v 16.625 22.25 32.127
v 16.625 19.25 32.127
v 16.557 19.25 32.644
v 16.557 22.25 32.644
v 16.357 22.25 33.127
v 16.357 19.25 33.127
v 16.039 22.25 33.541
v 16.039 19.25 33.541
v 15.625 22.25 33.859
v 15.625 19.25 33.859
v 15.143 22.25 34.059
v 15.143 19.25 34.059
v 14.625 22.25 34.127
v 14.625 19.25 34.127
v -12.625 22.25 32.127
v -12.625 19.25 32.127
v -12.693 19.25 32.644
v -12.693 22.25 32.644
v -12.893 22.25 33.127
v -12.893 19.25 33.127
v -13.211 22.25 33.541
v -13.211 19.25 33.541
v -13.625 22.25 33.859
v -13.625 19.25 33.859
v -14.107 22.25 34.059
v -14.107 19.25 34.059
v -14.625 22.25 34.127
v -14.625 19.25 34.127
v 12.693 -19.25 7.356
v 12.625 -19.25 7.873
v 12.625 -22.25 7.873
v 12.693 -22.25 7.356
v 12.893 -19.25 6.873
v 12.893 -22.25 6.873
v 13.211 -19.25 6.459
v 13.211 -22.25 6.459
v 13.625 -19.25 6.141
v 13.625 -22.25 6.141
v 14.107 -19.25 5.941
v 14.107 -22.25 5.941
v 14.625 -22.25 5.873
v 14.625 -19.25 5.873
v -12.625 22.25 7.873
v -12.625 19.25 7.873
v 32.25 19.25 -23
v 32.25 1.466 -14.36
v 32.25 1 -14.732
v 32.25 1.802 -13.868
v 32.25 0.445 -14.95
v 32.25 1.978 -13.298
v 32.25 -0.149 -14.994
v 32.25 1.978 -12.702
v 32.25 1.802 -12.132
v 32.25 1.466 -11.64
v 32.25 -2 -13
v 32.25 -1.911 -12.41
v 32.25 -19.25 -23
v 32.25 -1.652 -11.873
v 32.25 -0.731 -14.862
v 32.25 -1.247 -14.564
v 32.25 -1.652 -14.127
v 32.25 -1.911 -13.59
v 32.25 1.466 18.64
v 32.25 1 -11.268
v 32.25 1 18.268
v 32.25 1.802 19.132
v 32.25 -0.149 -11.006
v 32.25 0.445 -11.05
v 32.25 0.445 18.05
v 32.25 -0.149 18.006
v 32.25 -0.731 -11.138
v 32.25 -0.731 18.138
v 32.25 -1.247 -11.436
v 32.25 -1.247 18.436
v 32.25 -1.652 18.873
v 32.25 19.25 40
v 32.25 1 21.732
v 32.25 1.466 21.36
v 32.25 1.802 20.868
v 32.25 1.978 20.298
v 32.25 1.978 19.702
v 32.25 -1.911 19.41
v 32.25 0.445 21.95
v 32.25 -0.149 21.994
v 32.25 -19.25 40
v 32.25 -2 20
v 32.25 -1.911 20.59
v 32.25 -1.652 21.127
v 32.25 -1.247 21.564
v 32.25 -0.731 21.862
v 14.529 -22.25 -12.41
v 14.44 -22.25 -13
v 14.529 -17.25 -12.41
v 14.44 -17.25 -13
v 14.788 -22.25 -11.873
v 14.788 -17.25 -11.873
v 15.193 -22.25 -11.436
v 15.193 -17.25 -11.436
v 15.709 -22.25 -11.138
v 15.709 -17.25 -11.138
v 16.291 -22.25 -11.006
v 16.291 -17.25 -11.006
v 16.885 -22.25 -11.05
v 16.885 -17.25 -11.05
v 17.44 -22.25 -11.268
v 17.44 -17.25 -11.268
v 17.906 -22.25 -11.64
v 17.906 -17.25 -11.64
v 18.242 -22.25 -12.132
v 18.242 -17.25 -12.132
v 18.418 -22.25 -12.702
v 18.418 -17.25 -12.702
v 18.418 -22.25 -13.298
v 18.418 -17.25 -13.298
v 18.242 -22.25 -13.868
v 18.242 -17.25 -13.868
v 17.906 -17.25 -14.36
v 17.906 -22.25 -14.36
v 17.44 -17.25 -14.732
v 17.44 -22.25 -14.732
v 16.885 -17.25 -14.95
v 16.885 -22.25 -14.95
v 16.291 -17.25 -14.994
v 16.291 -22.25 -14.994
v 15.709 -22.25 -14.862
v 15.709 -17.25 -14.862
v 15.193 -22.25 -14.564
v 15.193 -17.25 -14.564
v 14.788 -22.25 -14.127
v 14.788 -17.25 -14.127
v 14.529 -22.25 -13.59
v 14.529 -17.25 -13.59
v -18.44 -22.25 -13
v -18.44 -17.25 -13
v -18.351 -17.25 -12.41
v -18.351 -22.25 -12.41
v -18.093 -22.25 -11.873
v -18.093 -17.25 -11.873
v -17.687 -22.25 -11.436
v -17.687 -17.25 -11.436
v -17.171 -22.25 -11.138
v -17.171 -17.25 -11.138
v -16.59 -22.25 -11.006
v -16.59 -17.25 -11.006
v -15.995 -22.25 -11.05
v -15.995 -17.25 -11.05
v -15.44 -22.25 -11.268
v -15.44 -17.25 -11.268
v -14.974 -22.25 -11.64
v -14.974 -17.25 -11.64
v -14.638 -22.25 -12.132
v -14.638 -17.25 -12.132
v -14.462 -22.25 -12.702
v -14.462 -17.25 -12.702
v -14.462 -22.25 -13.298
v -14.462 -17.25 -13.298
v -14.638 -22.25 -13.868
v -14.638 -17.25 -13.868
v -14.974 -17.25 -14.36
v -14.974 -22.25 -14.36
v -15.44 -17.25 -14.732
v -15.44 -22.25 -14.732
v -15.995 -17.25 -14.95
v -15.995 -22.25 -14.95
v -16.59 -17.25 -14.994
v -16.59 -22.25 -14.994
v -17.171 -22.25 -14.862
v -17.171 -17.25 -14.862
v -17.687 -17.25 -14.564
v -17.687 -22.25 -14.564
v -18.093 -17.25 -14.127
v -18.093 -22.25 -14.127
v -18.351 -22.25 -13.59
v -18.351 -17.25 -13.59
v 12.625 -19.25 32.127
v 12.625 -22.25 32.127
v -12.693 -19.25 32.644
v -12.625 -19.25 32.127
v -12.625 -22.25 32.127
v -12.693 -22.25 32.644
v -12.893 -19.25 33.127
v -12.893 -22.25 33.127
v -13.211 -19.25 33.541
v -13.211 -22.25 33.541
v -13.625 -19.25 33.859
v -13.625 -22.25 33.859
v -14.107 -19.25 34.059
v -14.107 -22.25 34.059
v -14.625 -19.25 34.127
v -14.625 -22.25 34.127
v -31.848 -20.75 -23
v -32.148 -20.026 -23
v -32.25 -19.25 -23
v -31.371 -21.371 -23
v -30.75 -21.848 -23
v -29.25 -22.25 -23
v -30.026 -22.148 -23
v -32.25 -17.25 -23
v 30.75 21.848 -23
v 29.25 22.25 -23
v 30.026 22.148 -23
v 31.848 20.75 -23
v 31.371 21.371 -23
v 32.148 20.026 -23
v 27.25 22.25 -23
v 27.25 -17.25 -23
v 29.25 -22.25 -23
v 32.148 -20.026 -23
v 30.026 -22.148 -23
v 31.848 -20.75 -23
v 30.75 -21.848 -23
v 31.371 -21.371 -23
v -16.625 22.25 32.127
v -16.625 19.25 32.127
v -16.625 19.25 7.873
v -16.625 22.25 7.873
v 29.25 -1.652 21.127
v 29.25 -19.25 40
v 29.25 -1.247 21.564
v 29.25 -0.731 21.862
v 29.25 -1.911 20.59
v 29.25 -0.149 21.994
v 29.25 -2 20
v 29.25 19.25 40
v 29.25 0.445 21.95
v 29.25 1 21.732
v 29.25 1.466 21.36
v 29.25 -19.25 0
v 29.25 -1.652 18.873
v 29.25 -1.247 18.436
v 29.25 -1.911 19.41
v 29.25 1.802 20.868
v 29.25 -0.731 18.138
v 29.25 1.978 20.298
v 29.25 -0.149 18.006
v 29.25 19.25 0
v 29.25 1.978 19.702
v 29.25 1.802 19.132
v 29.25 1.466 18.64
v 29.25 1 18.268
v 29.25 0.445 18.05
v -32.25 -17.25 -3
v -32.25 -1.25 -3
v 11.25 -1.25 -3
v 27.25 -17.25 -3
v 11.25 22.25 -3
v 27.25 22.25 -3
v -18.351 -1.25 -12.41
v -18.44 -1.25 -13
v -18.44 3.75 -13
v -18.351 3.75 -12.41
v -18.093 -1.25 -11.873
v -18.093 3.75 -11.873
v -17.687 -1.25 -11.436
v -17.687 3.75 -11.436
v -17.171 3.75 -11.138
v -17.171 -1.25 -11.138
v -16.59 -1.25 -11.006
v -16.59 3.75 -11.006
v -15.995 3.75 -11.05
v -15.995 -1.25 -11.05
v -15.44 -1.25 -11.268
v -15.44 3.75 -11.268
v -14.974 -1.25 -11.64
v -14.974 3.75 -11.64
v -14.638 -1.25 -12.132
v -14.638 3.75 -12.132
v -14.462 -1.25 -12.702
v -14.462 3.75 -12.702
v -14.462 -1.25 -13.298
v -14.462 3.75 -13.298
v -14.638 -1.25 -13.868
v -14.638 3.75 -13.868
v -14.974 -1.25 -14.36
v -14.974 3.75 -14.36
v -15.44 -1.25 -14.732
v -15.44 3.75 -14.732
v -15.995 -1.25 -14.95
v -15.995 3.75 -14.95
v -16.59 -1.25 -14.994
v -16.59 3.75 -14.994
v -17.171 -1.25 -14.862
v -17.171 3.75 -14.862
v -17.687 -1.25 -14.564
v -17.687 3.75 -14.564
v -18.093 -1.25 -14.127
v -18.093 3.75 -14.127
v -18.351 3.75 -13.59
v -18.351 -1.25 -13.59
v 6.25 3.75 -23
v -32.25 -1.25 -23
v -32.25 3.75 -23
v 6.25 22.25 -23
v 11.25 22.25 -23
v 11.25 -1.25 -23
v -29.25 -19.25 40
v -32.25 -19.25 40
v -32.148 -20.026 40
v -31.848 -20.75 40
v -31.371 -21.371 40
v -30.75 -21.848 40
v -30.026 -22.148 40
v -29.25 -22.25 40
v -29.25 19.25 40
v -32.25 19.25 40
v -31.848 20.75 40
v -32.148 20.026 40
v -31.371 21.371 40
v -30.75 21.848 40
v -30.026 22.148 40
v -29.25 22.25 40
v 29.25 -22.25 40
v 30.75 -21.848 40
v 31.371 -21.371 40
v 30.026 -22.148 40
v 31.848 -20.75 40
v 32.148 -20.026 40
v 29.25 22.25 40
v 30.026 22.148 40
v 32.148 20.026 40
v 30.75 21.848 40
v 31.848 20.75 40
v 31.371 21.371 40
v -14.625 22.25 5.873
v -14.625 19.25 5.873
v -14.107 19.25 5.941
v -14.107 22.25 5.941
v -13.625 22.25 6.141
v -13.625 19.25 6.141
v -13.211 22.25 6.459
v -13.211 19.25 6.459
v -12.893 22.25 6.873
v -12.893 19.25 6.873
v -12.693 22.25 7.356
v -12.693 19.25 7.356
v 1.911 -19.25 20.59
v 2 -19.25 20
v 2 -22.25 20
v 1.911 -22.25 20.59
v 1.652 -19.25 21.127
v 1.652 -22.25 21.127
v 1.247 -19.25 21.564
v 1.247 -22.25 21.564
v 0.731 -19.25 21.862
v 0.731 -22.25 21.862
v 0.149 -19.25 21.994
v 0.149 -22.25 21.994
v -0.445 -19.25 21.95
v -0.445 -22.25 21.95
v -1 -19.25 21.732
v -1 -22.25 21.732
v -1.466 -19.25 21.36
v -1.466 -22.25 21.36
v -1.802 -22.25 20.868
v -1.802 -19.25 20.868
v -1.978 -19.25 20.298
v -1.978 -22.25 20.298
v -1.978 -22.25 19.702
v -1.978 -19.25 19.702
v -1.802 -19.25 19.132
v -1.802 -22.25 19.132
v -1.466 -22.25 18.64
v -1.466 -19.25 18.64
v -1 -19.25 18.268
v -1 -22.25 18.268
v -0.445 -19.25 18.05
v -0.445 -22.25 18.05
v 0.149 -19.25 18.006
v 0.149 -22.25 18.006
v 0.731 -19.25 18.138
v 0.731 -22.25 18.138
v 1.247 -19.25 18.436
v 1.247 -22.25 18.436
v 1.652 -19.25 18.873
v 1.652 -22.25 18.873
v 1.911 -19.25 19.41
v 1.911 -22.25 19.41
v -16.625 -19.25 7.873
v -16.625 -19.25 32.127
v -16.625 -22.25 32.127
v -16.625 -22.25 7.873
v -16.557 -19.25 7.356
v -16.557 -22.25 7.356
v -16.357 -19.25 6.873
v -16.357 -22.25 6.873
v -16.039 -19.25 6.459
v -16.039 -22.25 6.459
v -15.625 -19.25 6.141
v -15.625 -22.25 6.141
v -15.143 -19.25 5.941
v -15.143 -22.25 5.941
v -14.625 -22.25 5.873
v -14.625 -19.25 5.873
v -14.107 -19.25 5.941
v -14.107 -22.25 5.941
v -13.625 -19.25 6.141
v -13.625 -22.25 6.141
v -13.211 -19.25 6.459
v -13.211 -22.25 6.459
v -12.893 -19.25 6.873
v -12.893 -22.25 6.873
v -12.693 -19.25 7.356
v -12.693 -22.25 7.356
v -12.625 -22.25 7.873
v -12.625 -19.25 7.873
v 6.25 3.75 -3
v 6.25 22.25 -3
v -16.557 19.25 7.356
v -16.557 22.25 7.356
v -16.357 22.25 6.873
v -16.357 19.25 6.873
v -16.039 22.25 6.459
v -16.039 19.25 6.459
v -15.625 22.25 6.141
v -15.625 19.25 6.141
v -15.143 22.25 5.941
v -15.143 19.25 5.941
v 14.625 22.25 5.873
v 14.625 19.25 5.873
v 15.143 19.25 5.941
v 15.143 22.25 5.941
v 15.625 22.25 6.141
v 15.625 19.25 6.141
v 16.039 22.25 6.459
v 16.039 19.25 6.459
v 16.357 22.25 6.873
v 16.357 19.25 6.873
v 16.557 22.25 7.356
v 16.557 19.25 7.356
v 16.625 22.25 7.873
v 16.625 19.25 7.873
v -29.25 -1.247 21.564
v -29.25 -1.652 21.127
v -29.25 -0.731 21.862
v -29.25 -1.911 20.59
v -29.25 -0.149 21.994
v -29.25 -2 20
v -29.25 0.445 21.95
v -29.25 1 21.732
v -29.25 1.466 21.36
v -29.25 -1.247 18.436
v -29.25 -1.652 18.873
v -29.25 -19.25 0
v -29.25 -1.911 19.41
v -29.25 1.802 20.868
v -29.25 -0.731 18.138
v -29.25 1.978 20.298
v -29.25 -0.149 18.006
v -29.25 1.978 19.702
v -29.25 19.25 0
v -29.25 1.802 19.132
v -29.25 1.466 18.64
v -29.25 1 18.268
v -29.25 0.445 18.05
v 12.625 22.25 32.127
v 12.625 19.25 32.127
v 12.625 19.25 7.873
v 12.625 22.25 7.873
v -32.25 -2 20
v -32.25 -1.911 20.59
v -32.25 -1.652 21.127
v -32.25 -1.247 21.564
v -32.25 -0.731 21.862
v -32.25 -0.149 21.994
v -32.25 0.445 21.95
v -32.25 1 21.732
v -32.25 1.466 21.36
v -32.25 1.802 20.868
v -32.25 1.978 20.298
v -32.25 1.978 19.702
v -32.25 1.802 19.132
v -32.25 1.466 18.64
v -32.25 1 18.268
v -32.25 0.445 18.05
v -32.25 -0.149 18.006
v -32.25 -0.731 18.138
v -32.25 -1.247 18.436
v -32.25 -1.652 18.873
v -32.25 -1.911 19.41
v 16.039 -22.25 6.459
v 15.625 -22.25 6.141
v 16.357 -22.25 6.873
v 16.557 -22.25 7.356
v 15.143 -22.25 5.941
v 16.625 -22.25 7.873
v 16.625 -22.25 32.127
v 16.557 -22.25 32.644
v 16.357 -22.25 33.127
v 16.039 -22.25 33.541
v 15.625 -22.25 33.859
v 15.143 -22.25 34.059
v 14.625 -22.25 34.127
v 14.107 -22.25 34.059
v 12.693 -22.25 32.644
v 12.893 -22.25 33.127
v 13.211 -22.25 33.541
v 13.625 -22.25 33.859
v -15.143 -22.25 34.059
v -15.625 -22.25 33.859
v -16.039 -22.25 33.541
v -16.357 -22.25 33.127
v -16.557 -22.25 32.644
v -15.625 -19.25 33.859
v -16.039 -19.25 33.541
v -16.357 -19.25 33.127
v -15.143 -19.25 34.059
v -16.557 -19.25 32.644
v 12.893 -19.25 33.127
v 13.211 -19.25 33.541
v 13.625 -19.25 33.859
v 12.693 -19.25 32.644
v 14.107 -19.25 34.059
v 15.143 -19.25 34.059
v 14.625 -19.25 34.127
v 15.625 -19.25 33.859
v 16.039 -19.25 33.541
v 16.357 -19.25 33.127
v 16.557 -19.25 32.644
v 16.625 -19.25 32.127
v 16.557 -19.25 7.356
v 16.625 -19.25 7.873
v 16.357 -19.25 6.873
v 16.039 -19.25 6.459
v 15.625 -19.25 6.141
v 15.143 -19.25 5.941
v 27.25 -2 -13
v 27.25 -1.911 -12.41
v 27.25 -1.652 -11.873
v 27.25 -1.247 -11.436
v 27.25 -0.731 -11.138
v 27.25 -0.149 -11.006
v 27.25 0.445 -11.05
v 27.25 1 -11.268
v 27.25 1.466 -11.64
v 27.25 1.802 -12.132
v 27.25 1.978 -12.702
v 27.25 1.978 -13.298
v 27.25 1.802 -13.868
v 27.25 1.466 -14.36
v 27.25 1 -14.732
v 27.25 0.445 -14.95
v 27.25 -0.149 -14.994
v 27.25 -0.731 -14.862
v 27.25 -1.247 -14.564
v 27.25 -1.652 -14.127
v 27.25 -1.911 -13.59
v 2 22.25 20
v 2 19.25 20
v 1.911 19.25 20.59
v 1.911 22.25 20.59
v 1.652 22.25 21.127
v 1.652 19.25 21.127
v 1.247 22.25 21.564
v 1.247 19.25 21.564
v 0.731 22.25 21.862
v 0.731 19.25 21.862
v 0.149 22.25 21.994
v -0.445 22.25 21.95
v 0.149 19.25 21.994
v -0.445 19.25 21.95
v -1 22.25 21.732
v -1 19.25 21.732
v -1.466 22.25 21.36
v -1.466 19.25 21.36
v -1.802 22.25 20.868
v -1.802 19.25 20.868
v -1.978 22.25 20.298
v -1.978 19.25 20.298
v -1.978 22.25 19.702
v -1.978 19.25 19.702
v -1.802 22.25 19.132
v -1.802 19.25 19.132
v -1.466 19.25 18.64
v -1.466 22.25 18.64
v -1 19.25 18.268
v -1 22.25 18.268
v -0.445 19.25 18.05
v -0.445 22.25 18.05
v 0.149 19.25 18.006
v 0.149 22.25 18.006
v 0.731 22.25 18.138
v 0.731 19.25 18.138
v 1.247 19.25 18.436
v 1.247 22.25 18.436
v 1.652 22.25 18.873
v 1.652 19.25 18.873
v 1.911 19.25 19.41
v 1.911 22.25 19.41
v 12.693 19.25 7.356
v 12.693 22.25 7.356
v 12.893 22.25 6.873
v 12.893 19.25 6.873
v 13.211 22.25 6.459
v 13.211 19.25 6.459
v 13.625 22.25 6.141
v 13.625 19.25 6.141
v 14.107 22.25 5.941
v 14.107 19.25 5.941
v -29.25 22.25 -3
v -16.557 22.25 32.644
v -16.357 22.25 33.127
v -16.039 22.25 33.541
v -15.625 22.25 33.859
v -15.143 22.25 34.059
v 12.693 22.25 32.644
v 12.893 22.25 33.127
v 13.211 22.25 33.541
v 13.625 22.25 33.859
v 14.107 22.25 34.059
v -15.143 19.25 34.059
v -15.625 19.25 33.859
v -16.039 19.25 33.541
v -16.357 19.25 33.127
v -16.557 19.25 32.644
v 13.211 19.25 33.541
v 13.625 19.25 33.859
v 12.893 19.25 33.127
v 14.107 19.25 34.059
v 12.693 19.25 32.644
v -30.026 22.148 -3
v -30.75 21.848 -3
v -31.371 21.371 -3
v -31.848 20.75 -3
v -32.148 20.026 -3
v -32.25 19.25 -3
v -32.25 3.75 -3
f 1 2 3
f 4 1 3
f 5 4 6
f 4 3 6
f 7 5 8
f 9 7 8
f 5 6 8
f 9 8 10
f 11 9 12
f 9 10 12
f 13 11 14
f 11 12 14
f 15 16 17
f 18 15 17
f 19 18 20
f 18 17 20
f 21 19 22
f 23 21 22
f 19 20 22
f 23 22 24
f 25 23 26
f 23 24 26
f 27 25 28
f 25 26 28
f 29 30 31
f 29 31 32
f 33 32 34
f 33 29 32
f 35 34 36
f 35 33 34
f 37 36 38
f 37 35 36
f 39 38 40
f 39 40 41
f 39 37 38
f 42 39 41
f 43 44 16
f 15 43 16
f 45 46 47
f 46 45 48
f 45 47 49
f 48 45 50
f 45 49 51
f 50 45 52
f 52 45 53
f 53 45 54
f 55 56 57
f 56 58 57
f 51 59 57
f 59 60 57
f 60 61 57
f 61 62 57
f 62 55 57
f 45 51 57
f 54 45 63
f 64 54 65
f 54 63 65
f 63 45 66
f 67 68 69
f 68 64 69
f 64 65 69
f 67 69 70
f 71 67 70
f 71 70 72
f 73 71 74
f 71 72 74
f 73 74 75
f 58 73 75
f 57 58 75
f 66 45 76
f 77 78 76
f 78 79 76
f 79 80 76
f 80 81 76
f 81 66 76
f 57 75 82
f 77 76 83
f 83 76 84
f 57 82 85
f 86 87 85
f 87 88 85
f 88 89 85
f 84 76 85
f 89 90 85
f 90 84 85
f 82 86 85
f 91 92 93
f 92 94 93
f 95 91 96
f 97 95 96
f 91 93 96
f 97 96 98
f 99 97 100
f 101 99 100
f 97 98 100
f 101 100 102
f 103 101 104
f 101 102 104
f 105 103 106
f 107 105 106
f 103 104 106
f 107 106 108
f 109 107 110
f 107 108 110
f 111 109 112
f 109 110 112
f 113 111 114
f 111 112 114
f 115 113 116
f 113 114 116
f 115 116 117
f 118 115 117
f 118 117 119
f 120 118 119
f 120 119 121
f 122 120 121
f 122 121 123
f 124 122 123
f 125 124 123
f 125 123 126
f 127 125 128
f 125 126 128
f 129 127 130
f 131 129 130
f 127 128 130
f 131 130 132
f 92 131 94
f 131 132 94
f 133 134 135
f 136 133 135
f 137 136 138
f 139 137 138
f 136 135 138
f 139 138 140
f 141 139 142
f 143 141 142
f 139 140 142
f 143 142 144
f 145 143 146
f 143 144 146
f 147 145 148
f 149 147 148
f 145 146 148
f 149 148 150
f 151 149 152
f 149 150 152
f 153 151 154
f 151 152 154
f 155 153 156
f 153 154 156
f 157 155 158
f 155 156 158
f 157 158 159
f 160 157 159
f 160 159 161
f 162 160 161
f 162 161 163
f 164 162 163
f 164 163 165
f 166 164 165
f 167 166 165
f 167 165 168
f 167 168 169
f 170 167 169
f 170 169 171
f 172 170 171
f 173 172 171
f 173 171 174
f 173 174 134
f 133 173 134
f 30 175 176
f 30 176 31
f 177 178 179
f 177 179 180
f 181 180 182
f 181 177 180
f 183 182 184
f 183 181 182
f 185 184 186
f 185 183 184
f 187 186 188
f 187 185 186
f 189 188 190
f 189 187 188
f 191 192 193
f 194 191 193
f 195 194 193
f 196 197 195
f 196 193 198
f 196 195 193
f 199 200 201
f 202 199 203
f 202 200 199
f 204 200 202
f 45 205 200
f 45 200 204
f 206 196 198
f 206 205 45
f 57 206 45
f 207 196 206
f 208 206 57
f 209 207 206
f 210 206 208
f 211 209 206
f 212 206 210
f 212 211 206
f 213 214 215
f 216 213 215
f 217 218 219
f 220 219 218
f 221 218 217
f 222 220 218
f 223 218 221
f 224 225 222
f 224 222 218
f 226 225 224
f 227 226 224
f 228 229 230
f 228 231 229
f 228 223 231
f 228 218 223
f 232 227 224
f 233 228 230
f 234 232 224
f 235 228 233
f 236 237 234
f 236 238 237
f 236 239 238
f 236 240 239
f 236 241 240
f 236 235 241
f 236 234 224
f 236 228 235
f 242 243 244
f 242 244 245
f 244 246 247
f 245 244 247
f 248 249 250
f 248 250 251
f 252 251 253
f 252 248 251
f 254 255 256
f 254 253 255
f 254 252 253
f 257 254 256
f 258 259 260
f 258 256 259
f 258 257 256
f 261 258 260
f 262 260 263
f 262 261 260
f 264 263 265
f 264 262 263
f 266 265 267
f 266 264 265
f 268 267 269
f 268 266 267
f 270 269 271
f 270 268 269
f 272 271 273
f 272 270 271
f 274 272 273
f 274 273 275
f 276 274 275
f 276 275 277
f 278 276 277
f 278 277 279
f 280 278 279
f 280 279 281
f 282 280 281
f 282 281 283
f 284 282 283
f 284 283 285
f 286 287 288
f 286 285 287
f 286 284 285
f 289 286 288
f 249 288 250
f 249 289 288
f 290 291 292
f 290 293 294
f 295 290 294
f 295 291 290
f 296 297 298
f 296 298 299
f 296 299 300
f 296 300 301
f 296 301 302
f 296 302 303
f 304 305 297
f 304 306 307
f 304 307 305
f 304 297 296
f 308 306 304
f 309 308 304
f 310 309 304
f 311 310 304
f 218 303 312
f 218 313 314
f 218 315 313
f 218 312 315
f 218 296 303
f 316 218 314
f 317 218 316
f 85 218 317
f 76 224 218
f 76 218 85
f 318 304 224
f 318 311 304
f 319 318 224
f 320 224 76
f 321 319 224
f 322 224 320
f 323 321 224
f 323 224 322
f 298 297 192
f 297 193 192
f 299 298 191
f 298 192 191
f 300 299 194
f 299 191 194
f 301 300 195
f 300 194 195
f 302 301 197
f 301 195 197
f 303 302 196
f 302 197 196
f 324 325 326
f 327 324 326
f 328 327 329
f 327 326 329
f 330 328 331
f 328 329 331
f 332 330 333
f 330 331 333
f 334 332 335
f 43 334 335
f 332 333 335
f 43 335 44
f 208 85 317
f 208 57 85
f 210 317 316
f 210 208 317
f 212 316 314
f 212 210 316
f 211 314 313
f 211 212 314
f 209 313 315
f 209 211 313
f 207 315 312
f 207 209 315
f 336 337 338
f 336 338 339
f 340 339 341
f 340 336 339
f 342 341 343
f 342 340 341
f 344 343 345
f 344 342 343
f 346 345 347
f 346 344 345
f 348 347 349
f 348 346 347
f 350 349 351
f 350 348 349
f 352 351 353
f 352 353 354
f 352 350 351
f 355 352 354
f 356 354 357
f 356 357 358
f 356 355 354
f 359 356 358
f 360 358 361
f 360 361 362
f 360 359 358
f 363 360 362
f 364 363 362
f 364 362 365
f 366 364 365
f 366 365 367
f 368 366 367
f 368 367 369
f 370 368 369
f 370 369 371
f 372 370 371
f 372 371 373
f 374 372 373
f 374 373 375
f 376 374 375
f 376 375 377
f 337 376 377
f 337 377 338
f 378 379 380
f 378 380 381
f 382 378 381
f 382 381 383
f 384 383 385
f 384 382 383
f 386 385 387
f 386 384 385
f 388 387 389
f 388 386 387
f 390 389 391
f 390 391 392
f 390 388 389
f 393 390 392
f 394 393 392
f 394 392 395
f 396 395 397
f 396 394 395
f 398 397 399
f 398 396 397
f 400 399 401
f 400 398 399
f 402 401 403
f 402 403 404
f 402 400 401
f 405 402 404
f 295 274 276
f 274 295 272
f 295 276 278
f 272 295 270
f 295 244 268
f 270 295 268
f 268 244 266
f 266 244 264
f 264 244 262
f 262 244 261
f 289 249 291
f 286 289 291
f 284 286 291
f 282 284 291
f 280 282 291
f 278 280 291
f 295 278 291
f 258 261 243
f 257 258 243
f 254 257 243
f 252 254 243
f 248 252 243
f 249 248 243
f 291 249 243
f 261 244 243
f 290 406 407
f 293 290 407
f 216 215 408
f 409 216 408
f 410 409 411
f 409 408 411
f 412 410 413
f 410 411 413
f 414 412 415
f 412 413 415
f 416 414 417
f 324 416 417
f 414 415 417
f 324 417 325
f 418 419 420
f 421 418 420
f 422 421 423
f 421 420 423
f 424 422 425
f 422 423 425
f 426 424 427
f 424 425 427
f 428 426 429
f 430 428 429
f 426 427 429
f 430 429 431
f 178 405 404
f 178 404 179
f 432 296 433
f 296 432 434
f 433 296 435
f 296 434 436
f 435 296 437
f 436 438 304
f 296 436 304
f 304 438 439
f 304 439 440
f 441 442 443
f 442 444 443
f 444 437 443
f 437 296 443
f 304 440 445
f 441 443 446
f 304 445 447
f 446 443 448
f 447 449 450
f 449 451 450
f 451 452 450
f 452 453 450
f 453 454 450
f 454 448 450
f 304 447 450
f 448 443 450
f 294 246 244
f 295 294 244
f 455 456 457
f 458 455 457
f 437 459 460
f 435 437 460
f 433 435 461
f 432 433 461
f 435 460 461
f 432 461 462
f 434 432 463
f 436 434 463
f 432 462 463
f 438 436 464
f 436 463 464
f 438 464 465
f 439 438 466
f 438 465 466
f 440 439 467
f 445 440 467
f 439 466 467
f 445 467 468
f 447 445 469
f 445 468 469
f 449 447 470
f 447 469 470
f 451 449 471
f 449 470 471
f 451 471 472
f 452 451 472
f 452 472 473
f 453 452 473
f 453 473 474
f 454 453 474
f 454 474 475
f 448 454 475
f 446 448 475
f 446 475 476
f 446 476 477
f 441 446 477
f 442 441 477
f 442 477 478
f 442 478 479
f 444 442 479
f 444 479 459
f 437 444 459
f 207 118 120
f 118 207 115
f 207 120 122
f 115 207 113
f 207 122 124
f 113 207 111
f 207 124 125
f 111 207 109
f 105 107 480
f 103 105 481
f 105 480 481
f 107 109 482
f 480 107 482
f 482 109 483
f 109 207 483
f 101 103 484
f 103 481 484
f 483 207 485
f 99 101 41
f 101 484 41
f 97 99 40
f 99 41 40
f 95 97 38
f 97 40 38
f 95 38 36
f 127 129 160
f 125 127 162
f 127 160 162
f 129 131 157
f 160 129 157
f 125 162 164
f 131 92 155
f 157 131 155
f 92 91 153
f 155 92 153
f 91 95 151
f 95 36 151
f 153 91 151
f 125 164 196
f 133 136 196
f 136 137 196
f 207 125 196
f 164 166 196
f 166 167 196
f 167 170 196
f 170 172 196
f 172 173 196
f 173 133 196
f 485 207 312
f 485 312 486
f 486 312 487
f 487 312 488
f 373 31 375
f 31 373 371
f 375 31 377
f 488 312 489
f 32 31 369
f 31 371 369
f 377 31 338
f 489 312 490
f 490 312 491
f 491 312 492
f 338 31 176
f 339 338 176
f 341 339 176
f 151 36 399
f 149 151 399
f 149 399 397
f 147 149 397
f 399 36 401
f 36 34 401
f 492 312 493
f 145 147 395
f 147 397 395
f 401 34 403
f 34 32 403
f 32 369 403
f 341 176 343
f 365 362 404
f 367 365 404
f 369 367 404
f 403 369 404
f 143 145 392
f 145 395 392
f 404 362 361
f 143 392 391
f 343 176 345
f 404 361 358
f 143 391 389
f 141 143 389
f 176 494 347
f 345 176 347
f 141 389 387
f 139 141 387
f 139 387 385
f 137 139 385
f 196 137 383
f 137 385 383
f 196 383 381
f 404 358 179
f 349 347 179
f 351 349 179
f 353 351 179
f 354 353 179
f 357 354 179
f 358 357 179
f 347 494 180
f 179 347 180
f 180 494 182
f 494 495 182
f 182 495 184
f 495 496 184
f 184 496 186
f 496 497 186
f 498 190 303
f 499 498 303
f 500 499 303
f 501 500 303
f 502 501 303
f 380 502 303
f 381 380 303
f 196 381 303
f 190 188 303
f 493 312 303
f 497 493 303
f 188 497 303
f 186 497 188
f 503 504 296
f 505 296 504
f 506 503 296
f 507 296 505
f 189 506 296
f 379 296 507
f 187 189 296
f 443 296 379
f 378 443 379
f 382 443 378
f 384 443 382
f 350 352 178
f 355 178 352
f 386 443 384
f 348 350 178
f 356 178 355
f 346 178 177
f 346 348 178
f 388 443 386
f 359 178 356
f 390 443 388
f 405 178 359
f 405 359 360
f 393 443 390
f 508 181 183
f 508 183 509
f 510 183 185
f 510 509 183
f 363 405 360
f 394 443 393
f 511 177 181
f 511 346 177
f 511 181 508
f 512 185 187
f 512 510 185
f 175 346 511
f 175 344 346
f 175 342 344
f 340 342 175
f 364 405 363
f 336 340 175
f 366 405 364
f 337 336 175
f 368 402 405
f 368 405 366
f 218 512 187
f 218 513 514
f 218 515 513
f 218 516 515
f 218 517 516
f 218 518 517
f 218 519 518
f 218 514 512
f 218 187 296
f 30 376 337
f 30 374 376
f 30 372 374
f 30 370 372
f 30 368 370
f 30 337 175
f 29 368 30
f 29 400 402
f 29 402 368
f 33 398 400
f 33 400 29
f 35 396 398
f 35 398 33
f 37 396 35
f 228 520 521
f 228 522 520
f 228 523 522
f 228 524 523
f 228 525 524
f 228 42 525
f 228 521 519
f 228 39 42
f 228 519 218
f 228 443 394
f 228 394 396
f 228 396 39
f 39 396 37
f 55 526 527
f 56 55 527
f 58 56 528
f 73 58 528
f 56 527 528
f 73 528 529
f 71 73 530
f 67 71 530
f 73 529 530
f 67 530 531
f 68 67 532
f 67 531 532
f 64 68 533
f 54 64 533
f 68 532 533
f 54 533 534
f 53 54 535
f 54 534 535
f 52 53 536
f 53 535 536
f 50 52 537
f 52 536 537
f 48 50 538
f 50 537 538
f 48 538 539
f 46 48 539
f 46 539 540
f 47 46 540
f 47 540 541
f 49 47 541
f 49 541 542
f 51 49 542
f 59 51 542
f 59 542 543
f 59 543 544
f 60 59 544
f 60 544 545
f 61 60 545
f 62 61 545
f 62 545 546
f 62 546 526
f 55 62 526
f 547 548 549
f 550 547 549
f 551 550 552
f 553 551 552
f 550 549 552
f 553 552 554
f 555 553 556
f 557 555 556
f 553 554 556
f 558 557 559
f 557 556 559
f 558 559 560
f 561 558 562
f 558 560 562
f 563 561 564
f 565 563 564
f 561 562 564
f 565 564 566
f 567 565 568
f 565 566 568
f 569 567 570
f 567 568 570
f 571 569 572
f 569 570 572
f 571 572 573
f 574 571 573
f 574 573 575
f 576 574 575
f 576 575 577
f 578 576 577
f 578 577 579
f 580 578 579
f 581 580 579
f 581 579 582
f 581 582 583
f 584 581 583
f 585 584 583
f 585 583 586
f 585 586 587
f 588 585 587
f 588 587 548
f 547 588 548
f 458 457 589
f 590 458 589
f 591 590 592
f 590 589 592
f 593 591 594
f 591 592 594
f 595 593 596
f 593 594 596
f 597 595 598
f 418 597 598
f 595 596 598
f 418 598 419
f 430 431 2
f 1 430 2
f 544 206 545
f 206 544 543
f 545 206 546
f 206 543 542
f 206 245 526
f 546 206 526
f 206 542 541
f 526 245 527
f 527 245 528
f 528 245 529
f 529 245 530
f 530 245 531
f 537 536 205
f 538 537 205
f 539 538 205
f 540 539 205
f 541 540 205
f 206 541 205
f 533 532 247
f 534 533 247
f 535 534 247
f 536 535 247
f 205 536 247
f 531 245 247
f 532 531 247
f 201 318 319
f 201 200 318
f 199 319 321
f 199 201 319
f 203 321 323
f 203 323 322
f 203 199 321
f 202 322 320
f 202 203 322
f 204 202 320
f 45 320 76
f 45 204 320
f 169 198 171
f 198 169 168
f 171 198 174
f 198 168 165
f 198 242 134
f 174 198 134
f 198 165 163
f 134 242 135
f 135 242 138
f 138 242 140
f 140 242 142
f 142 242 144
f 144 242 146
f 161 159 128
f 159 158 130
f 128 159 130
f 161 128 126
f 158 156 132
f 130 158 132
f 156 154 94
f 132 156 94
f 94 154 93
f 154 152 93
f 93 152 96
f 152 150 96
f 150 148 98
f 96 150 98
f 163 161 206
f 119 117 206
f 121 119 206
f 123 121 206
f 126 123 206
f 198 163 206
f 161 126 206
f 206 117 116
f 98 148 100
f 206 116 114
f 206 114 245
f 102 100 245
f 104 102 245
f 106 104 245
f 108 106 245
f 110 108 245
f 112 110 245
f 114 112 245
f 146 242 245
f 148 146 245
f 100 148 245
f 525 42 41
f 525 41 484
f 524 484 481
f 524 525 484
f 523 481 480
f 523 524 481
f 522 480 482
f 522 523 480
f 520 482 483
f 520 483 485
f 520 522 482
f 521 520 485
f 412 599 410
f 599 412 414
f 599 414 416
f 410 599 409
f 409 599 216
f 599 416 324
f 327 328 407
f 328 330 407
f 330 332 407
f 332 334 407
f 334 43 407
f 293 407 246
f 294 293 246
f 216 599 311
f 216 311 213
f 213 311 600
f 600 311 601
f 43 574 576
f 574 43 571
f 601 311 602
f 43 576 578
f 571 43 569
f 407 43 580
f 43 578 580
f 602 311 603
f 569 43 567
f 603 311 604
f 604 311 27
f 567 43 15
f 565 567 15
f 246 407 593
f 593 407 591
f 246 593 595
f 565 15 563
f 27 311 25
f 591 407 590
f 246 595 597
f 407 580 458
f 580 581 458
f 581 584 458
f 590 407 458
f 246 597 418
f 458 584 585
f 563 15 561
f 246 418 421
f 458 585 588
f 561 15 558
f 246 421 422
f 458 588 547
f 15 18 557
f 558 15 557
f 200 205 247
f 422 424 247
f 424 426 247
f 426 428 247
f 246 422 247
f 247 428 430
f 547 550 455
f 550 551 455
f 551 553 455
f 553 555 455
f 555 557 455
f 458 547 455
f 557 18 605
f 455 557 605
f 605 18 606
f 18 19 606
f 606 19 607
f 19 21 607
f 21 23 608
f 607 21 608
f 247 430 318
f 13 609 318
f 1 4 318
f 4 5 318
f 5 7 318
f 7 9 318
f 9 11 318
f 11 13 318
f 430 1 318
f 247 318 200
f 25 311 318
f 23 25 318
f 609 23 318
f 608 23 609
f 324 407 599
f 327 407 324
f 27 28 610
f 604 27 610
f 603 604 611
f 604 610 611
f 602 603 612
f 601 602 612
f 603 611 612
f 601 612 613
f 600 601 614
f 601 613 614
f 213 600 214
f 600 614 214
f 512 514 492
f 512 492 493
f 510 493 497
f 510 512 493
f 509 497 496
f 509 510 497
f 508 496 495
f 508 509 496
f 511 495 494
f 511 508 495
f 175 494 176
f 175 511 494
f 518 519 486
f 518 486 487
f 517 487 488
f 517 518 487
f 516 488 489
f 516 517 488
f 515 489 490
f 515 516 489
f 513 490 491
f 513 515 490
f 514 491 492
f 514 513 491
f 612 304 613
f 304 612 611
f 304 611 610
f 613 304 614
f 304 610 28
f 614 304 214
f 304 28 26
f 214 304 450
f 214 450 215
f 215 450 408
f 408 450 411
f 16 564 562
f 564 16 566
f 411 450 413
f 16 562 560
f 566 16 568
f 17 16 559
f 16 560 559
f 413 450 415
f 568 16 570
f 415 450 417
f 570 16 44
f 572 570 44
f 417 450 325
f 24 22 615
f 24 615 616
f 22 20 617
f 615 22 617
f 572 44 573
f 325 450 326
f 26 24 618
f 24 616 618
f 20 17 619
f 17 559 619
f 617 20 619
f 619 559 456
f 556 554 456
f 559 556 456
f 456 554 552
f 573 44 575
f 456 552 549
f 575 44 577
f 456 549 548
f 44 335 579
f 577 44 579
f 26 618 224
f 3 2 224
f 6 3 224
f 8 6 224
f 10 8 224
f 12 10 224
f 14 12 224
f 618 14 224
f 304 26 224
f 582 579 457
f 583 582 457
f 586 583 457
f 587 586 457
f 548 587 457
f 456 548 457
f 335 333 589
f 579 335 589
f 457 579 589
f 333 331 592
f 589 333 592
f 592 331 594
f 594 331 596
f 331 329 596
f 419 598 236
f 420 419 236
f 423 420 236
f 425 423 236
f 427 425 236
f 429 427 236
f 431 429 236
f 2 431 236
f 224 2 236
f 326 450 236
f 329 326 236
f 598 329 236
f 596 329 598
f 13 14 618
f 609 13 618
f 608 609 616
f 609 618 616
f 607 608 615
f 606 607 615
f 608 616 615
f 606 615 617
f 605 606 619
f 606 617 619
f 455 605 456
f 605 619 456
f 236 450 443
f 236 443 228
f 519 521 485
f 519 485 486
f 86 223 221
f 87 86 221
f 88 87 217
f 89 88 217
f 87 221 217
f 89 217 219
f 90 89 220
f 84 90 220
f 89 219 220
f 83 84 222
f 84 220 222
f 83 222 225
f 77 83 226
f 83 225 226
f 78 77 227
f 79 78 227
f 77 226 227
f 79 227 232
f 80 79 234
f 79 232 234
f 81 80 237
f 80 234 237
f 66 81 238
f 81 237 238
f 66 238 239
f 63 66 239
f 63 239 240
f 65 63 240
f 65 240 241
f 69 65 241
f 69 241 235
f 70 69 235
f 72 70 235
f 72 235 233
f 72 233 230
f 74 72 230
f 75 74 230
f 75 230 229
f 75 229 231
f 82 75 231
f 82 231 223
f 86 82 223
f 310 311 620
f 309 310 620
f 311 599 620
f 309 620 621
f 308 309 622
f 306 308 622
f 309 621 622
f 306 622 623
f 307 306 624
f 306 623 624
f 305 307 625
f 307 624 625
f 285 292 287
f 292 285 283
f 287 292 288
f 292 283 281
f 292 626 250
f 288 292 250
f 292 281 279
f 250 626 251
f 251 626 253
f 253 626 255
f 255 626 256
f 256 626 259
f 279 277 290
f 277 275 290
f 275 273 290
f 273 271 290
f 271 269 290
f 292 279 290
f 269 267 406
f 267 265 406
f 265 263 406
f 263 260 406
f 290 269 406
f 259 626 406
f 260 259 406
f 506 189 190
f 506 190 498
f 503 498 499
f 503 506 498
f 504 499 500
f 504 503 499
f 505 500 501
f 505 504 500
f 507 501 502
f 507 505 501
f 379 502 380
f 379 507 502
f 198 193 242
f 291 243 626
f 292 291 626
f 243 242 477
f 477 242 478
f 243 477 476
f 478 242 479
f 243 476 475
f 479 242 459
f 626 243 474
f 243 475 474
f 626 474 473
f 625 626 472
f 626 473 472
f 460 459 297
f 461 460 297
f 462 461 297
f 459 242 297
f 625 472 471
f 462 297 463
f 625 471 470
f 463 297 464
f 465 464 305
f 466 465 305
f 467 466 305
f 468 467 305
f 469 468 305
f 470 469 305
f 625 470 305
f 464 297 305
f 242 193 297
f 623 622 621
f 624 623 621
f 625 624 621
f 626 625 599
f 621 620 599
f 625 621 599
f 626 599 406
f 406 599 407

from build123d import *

# Parameters (mm, degrees)
F0_W          = 64.5
F0_H          = 44.5
F0_W_2        = 58.5
F0_H_2        = 38.5
F1_DEPTH      = 40
F2_DEPTH      = 3
F4_DEPTH      = 20
F5_R          = 2
F6_DEPTH      = 3.001
F6_DEPTH_BACK = 41.5
F7_R          = 3
F8_R          = 2
F9_DEPTH      = 25
F10_R         = 2
F11_DEPTH     = 25
F12_R         = 2
F13_DEPTH     = 64.501


with BuildPart() as f1:
    # F0 (on Top) → F1 (new body)
    with BuildSketch(Plane.XY):
        Rectangle(F0_W, F0_H)
        Rectangle(F0_W_2, F0_H_2, mode=Mode.SUBTRACT)
    extrude(amount=F1_DEPTH)

    # F0 (on Top) → F2 (join)
    with BuildSketch(Plane.XY):
        Rectangle(F0_W, F0_H)
        Rectangle(F0_W_2, F0_H_2, mode=Mode.SUBTRACT)
        Rectangle(F0_W_2, F0_H_2)
    extrude(amount=-F2_DEPTH)

    # F3 (on face) → F4 (join)
    with BuildSketch(Plane(origin=(0, 0, -3), x_dir=(1, 0, 0), z_dir=(0, 0, -1))):
        Polygon((27.25, -22.25), (32.25, -22.25), (32.25, 22.25), (-32.25, 22.25), (-32.25, 17.25), (27.25, 17.25), align=None)
        Polygon((11.25, 1.25), (-32.25, 1.25), (-32.25, -3.75), (6.25, -3.75), (6.25, -22.25), (11.25, -22.25), align=None)
    extrude(amount=F4_DEPTH)

    # F5 (on face) → F6 (cut, two sides)
    with BuildSketch(Plane.XZ.offset(-19.25)) as f6_sk:
        with BuildLine():
            ThreePointArc((14.625, 5.8733418593), (16.0392135624, 6.4591282969), (16.625, 7.8733418593))
            Line((16.625, 7.8733418593), (16.625, 32.1266581407))
            ThreePointArc((16.625, 32.1266581407), (16.0392135624, 33.5408717031), (14.625, 34.1266581407))
            ThreePointArc((14.625, 34.1266581407), (13.2107864376, 33.5408717031), (12.625, 32.1266581407))
            Line((12.625, 32.1266581407), (12.625, 7.8733418593))
            ThreePointArc((12.625, 7.8733418593), (13.2107864376, 6.4591282969), (14.625, 5.8733418593))
        make_face()
        with BuildLine():
            ThreePointArc((-12.625, 32.1266581407), (-13.2107864376, 33.5408717031), (-14.625, 34.1266581407))
            ThreePointArc((-14.625, 34.1266581407), (-16.0392135624, 33.5408717031), (-16.625, 32.1266581407))
            Line((-16.625, 32.1266581407), (-16.625, 7.8733418593))
            ThreePointArc((-16.625, 7.8733418593), (-16.0392135624, 6.4591282969), (-14.625, 5.8733418593))
            ThreePointArc((-14.625, 5.8733418593), (-13.2107864376, 6.4591282969), (-12.625, 7.8733418593))
            Line((-12.625, 7.8733418593), (-12.625, 32.1266581407))
        make_face()
        with Locations((0, 20)):
            Circle(F5_R)
    extrude(amount=-F6_DEPTH, mode=Mode.SUBTRACT)
    extrude(f6_sk.sketch, amount=F6_DEPTH_BACK, mode=Mode.SUBTRACT)

    # F7
    f7_edges = [f1.edges().sort_by_distance(p)[0] for p in [
        (-32.25, 22.25, 18.5),
        (-32.25, -22.25, 8.5),
        (32.25, 22.25, 8.5),
        (32.25, -22.25, 8.5),
    ]]
    fillet(f7_edges, radius=F7_R)

    # F8 (on face) → F9 (cut, symmetric)
    with BuildSketch(Plane(origin=(0, -17.25, 0), x_dir=(-1, 0, 0), z_dir=(0, 1, 0))):
        with Locations((16.4400730282, -13)):
            Circle(F8_R)
        with Locations((-16.4400730282, -13)):
            Circle(F8_R)
    extrude(amount=F9_DEPTH, both=True, mode=Mode.SUBTRACT)

    # F10 (on face) → F11 (cut)
    with BuildSketch(Plane(origin=(27.25, 0, 0), x_dir=(0, -1, 0), z_dir=(-1, 0, 0))):
        with Locations((0, -13)):
            Circle(F10_R)
    extrude(amount=-F11_DEPTH, mode=Mode.SUBTRACT)

    # F12 (on face) → F13 (cut, through all)
    with BuildSketch(Plane(origin=(-32.25, 0, 0), x_dir=(0, -1, 0), z_dir=(-1, 0, 0))):
        with Locations((0, 20)):
            Circle(F12_R)
    extrude(amount=-F13_DEPTH, mode=Mode.SUBTRACT)


solid = f1.part
